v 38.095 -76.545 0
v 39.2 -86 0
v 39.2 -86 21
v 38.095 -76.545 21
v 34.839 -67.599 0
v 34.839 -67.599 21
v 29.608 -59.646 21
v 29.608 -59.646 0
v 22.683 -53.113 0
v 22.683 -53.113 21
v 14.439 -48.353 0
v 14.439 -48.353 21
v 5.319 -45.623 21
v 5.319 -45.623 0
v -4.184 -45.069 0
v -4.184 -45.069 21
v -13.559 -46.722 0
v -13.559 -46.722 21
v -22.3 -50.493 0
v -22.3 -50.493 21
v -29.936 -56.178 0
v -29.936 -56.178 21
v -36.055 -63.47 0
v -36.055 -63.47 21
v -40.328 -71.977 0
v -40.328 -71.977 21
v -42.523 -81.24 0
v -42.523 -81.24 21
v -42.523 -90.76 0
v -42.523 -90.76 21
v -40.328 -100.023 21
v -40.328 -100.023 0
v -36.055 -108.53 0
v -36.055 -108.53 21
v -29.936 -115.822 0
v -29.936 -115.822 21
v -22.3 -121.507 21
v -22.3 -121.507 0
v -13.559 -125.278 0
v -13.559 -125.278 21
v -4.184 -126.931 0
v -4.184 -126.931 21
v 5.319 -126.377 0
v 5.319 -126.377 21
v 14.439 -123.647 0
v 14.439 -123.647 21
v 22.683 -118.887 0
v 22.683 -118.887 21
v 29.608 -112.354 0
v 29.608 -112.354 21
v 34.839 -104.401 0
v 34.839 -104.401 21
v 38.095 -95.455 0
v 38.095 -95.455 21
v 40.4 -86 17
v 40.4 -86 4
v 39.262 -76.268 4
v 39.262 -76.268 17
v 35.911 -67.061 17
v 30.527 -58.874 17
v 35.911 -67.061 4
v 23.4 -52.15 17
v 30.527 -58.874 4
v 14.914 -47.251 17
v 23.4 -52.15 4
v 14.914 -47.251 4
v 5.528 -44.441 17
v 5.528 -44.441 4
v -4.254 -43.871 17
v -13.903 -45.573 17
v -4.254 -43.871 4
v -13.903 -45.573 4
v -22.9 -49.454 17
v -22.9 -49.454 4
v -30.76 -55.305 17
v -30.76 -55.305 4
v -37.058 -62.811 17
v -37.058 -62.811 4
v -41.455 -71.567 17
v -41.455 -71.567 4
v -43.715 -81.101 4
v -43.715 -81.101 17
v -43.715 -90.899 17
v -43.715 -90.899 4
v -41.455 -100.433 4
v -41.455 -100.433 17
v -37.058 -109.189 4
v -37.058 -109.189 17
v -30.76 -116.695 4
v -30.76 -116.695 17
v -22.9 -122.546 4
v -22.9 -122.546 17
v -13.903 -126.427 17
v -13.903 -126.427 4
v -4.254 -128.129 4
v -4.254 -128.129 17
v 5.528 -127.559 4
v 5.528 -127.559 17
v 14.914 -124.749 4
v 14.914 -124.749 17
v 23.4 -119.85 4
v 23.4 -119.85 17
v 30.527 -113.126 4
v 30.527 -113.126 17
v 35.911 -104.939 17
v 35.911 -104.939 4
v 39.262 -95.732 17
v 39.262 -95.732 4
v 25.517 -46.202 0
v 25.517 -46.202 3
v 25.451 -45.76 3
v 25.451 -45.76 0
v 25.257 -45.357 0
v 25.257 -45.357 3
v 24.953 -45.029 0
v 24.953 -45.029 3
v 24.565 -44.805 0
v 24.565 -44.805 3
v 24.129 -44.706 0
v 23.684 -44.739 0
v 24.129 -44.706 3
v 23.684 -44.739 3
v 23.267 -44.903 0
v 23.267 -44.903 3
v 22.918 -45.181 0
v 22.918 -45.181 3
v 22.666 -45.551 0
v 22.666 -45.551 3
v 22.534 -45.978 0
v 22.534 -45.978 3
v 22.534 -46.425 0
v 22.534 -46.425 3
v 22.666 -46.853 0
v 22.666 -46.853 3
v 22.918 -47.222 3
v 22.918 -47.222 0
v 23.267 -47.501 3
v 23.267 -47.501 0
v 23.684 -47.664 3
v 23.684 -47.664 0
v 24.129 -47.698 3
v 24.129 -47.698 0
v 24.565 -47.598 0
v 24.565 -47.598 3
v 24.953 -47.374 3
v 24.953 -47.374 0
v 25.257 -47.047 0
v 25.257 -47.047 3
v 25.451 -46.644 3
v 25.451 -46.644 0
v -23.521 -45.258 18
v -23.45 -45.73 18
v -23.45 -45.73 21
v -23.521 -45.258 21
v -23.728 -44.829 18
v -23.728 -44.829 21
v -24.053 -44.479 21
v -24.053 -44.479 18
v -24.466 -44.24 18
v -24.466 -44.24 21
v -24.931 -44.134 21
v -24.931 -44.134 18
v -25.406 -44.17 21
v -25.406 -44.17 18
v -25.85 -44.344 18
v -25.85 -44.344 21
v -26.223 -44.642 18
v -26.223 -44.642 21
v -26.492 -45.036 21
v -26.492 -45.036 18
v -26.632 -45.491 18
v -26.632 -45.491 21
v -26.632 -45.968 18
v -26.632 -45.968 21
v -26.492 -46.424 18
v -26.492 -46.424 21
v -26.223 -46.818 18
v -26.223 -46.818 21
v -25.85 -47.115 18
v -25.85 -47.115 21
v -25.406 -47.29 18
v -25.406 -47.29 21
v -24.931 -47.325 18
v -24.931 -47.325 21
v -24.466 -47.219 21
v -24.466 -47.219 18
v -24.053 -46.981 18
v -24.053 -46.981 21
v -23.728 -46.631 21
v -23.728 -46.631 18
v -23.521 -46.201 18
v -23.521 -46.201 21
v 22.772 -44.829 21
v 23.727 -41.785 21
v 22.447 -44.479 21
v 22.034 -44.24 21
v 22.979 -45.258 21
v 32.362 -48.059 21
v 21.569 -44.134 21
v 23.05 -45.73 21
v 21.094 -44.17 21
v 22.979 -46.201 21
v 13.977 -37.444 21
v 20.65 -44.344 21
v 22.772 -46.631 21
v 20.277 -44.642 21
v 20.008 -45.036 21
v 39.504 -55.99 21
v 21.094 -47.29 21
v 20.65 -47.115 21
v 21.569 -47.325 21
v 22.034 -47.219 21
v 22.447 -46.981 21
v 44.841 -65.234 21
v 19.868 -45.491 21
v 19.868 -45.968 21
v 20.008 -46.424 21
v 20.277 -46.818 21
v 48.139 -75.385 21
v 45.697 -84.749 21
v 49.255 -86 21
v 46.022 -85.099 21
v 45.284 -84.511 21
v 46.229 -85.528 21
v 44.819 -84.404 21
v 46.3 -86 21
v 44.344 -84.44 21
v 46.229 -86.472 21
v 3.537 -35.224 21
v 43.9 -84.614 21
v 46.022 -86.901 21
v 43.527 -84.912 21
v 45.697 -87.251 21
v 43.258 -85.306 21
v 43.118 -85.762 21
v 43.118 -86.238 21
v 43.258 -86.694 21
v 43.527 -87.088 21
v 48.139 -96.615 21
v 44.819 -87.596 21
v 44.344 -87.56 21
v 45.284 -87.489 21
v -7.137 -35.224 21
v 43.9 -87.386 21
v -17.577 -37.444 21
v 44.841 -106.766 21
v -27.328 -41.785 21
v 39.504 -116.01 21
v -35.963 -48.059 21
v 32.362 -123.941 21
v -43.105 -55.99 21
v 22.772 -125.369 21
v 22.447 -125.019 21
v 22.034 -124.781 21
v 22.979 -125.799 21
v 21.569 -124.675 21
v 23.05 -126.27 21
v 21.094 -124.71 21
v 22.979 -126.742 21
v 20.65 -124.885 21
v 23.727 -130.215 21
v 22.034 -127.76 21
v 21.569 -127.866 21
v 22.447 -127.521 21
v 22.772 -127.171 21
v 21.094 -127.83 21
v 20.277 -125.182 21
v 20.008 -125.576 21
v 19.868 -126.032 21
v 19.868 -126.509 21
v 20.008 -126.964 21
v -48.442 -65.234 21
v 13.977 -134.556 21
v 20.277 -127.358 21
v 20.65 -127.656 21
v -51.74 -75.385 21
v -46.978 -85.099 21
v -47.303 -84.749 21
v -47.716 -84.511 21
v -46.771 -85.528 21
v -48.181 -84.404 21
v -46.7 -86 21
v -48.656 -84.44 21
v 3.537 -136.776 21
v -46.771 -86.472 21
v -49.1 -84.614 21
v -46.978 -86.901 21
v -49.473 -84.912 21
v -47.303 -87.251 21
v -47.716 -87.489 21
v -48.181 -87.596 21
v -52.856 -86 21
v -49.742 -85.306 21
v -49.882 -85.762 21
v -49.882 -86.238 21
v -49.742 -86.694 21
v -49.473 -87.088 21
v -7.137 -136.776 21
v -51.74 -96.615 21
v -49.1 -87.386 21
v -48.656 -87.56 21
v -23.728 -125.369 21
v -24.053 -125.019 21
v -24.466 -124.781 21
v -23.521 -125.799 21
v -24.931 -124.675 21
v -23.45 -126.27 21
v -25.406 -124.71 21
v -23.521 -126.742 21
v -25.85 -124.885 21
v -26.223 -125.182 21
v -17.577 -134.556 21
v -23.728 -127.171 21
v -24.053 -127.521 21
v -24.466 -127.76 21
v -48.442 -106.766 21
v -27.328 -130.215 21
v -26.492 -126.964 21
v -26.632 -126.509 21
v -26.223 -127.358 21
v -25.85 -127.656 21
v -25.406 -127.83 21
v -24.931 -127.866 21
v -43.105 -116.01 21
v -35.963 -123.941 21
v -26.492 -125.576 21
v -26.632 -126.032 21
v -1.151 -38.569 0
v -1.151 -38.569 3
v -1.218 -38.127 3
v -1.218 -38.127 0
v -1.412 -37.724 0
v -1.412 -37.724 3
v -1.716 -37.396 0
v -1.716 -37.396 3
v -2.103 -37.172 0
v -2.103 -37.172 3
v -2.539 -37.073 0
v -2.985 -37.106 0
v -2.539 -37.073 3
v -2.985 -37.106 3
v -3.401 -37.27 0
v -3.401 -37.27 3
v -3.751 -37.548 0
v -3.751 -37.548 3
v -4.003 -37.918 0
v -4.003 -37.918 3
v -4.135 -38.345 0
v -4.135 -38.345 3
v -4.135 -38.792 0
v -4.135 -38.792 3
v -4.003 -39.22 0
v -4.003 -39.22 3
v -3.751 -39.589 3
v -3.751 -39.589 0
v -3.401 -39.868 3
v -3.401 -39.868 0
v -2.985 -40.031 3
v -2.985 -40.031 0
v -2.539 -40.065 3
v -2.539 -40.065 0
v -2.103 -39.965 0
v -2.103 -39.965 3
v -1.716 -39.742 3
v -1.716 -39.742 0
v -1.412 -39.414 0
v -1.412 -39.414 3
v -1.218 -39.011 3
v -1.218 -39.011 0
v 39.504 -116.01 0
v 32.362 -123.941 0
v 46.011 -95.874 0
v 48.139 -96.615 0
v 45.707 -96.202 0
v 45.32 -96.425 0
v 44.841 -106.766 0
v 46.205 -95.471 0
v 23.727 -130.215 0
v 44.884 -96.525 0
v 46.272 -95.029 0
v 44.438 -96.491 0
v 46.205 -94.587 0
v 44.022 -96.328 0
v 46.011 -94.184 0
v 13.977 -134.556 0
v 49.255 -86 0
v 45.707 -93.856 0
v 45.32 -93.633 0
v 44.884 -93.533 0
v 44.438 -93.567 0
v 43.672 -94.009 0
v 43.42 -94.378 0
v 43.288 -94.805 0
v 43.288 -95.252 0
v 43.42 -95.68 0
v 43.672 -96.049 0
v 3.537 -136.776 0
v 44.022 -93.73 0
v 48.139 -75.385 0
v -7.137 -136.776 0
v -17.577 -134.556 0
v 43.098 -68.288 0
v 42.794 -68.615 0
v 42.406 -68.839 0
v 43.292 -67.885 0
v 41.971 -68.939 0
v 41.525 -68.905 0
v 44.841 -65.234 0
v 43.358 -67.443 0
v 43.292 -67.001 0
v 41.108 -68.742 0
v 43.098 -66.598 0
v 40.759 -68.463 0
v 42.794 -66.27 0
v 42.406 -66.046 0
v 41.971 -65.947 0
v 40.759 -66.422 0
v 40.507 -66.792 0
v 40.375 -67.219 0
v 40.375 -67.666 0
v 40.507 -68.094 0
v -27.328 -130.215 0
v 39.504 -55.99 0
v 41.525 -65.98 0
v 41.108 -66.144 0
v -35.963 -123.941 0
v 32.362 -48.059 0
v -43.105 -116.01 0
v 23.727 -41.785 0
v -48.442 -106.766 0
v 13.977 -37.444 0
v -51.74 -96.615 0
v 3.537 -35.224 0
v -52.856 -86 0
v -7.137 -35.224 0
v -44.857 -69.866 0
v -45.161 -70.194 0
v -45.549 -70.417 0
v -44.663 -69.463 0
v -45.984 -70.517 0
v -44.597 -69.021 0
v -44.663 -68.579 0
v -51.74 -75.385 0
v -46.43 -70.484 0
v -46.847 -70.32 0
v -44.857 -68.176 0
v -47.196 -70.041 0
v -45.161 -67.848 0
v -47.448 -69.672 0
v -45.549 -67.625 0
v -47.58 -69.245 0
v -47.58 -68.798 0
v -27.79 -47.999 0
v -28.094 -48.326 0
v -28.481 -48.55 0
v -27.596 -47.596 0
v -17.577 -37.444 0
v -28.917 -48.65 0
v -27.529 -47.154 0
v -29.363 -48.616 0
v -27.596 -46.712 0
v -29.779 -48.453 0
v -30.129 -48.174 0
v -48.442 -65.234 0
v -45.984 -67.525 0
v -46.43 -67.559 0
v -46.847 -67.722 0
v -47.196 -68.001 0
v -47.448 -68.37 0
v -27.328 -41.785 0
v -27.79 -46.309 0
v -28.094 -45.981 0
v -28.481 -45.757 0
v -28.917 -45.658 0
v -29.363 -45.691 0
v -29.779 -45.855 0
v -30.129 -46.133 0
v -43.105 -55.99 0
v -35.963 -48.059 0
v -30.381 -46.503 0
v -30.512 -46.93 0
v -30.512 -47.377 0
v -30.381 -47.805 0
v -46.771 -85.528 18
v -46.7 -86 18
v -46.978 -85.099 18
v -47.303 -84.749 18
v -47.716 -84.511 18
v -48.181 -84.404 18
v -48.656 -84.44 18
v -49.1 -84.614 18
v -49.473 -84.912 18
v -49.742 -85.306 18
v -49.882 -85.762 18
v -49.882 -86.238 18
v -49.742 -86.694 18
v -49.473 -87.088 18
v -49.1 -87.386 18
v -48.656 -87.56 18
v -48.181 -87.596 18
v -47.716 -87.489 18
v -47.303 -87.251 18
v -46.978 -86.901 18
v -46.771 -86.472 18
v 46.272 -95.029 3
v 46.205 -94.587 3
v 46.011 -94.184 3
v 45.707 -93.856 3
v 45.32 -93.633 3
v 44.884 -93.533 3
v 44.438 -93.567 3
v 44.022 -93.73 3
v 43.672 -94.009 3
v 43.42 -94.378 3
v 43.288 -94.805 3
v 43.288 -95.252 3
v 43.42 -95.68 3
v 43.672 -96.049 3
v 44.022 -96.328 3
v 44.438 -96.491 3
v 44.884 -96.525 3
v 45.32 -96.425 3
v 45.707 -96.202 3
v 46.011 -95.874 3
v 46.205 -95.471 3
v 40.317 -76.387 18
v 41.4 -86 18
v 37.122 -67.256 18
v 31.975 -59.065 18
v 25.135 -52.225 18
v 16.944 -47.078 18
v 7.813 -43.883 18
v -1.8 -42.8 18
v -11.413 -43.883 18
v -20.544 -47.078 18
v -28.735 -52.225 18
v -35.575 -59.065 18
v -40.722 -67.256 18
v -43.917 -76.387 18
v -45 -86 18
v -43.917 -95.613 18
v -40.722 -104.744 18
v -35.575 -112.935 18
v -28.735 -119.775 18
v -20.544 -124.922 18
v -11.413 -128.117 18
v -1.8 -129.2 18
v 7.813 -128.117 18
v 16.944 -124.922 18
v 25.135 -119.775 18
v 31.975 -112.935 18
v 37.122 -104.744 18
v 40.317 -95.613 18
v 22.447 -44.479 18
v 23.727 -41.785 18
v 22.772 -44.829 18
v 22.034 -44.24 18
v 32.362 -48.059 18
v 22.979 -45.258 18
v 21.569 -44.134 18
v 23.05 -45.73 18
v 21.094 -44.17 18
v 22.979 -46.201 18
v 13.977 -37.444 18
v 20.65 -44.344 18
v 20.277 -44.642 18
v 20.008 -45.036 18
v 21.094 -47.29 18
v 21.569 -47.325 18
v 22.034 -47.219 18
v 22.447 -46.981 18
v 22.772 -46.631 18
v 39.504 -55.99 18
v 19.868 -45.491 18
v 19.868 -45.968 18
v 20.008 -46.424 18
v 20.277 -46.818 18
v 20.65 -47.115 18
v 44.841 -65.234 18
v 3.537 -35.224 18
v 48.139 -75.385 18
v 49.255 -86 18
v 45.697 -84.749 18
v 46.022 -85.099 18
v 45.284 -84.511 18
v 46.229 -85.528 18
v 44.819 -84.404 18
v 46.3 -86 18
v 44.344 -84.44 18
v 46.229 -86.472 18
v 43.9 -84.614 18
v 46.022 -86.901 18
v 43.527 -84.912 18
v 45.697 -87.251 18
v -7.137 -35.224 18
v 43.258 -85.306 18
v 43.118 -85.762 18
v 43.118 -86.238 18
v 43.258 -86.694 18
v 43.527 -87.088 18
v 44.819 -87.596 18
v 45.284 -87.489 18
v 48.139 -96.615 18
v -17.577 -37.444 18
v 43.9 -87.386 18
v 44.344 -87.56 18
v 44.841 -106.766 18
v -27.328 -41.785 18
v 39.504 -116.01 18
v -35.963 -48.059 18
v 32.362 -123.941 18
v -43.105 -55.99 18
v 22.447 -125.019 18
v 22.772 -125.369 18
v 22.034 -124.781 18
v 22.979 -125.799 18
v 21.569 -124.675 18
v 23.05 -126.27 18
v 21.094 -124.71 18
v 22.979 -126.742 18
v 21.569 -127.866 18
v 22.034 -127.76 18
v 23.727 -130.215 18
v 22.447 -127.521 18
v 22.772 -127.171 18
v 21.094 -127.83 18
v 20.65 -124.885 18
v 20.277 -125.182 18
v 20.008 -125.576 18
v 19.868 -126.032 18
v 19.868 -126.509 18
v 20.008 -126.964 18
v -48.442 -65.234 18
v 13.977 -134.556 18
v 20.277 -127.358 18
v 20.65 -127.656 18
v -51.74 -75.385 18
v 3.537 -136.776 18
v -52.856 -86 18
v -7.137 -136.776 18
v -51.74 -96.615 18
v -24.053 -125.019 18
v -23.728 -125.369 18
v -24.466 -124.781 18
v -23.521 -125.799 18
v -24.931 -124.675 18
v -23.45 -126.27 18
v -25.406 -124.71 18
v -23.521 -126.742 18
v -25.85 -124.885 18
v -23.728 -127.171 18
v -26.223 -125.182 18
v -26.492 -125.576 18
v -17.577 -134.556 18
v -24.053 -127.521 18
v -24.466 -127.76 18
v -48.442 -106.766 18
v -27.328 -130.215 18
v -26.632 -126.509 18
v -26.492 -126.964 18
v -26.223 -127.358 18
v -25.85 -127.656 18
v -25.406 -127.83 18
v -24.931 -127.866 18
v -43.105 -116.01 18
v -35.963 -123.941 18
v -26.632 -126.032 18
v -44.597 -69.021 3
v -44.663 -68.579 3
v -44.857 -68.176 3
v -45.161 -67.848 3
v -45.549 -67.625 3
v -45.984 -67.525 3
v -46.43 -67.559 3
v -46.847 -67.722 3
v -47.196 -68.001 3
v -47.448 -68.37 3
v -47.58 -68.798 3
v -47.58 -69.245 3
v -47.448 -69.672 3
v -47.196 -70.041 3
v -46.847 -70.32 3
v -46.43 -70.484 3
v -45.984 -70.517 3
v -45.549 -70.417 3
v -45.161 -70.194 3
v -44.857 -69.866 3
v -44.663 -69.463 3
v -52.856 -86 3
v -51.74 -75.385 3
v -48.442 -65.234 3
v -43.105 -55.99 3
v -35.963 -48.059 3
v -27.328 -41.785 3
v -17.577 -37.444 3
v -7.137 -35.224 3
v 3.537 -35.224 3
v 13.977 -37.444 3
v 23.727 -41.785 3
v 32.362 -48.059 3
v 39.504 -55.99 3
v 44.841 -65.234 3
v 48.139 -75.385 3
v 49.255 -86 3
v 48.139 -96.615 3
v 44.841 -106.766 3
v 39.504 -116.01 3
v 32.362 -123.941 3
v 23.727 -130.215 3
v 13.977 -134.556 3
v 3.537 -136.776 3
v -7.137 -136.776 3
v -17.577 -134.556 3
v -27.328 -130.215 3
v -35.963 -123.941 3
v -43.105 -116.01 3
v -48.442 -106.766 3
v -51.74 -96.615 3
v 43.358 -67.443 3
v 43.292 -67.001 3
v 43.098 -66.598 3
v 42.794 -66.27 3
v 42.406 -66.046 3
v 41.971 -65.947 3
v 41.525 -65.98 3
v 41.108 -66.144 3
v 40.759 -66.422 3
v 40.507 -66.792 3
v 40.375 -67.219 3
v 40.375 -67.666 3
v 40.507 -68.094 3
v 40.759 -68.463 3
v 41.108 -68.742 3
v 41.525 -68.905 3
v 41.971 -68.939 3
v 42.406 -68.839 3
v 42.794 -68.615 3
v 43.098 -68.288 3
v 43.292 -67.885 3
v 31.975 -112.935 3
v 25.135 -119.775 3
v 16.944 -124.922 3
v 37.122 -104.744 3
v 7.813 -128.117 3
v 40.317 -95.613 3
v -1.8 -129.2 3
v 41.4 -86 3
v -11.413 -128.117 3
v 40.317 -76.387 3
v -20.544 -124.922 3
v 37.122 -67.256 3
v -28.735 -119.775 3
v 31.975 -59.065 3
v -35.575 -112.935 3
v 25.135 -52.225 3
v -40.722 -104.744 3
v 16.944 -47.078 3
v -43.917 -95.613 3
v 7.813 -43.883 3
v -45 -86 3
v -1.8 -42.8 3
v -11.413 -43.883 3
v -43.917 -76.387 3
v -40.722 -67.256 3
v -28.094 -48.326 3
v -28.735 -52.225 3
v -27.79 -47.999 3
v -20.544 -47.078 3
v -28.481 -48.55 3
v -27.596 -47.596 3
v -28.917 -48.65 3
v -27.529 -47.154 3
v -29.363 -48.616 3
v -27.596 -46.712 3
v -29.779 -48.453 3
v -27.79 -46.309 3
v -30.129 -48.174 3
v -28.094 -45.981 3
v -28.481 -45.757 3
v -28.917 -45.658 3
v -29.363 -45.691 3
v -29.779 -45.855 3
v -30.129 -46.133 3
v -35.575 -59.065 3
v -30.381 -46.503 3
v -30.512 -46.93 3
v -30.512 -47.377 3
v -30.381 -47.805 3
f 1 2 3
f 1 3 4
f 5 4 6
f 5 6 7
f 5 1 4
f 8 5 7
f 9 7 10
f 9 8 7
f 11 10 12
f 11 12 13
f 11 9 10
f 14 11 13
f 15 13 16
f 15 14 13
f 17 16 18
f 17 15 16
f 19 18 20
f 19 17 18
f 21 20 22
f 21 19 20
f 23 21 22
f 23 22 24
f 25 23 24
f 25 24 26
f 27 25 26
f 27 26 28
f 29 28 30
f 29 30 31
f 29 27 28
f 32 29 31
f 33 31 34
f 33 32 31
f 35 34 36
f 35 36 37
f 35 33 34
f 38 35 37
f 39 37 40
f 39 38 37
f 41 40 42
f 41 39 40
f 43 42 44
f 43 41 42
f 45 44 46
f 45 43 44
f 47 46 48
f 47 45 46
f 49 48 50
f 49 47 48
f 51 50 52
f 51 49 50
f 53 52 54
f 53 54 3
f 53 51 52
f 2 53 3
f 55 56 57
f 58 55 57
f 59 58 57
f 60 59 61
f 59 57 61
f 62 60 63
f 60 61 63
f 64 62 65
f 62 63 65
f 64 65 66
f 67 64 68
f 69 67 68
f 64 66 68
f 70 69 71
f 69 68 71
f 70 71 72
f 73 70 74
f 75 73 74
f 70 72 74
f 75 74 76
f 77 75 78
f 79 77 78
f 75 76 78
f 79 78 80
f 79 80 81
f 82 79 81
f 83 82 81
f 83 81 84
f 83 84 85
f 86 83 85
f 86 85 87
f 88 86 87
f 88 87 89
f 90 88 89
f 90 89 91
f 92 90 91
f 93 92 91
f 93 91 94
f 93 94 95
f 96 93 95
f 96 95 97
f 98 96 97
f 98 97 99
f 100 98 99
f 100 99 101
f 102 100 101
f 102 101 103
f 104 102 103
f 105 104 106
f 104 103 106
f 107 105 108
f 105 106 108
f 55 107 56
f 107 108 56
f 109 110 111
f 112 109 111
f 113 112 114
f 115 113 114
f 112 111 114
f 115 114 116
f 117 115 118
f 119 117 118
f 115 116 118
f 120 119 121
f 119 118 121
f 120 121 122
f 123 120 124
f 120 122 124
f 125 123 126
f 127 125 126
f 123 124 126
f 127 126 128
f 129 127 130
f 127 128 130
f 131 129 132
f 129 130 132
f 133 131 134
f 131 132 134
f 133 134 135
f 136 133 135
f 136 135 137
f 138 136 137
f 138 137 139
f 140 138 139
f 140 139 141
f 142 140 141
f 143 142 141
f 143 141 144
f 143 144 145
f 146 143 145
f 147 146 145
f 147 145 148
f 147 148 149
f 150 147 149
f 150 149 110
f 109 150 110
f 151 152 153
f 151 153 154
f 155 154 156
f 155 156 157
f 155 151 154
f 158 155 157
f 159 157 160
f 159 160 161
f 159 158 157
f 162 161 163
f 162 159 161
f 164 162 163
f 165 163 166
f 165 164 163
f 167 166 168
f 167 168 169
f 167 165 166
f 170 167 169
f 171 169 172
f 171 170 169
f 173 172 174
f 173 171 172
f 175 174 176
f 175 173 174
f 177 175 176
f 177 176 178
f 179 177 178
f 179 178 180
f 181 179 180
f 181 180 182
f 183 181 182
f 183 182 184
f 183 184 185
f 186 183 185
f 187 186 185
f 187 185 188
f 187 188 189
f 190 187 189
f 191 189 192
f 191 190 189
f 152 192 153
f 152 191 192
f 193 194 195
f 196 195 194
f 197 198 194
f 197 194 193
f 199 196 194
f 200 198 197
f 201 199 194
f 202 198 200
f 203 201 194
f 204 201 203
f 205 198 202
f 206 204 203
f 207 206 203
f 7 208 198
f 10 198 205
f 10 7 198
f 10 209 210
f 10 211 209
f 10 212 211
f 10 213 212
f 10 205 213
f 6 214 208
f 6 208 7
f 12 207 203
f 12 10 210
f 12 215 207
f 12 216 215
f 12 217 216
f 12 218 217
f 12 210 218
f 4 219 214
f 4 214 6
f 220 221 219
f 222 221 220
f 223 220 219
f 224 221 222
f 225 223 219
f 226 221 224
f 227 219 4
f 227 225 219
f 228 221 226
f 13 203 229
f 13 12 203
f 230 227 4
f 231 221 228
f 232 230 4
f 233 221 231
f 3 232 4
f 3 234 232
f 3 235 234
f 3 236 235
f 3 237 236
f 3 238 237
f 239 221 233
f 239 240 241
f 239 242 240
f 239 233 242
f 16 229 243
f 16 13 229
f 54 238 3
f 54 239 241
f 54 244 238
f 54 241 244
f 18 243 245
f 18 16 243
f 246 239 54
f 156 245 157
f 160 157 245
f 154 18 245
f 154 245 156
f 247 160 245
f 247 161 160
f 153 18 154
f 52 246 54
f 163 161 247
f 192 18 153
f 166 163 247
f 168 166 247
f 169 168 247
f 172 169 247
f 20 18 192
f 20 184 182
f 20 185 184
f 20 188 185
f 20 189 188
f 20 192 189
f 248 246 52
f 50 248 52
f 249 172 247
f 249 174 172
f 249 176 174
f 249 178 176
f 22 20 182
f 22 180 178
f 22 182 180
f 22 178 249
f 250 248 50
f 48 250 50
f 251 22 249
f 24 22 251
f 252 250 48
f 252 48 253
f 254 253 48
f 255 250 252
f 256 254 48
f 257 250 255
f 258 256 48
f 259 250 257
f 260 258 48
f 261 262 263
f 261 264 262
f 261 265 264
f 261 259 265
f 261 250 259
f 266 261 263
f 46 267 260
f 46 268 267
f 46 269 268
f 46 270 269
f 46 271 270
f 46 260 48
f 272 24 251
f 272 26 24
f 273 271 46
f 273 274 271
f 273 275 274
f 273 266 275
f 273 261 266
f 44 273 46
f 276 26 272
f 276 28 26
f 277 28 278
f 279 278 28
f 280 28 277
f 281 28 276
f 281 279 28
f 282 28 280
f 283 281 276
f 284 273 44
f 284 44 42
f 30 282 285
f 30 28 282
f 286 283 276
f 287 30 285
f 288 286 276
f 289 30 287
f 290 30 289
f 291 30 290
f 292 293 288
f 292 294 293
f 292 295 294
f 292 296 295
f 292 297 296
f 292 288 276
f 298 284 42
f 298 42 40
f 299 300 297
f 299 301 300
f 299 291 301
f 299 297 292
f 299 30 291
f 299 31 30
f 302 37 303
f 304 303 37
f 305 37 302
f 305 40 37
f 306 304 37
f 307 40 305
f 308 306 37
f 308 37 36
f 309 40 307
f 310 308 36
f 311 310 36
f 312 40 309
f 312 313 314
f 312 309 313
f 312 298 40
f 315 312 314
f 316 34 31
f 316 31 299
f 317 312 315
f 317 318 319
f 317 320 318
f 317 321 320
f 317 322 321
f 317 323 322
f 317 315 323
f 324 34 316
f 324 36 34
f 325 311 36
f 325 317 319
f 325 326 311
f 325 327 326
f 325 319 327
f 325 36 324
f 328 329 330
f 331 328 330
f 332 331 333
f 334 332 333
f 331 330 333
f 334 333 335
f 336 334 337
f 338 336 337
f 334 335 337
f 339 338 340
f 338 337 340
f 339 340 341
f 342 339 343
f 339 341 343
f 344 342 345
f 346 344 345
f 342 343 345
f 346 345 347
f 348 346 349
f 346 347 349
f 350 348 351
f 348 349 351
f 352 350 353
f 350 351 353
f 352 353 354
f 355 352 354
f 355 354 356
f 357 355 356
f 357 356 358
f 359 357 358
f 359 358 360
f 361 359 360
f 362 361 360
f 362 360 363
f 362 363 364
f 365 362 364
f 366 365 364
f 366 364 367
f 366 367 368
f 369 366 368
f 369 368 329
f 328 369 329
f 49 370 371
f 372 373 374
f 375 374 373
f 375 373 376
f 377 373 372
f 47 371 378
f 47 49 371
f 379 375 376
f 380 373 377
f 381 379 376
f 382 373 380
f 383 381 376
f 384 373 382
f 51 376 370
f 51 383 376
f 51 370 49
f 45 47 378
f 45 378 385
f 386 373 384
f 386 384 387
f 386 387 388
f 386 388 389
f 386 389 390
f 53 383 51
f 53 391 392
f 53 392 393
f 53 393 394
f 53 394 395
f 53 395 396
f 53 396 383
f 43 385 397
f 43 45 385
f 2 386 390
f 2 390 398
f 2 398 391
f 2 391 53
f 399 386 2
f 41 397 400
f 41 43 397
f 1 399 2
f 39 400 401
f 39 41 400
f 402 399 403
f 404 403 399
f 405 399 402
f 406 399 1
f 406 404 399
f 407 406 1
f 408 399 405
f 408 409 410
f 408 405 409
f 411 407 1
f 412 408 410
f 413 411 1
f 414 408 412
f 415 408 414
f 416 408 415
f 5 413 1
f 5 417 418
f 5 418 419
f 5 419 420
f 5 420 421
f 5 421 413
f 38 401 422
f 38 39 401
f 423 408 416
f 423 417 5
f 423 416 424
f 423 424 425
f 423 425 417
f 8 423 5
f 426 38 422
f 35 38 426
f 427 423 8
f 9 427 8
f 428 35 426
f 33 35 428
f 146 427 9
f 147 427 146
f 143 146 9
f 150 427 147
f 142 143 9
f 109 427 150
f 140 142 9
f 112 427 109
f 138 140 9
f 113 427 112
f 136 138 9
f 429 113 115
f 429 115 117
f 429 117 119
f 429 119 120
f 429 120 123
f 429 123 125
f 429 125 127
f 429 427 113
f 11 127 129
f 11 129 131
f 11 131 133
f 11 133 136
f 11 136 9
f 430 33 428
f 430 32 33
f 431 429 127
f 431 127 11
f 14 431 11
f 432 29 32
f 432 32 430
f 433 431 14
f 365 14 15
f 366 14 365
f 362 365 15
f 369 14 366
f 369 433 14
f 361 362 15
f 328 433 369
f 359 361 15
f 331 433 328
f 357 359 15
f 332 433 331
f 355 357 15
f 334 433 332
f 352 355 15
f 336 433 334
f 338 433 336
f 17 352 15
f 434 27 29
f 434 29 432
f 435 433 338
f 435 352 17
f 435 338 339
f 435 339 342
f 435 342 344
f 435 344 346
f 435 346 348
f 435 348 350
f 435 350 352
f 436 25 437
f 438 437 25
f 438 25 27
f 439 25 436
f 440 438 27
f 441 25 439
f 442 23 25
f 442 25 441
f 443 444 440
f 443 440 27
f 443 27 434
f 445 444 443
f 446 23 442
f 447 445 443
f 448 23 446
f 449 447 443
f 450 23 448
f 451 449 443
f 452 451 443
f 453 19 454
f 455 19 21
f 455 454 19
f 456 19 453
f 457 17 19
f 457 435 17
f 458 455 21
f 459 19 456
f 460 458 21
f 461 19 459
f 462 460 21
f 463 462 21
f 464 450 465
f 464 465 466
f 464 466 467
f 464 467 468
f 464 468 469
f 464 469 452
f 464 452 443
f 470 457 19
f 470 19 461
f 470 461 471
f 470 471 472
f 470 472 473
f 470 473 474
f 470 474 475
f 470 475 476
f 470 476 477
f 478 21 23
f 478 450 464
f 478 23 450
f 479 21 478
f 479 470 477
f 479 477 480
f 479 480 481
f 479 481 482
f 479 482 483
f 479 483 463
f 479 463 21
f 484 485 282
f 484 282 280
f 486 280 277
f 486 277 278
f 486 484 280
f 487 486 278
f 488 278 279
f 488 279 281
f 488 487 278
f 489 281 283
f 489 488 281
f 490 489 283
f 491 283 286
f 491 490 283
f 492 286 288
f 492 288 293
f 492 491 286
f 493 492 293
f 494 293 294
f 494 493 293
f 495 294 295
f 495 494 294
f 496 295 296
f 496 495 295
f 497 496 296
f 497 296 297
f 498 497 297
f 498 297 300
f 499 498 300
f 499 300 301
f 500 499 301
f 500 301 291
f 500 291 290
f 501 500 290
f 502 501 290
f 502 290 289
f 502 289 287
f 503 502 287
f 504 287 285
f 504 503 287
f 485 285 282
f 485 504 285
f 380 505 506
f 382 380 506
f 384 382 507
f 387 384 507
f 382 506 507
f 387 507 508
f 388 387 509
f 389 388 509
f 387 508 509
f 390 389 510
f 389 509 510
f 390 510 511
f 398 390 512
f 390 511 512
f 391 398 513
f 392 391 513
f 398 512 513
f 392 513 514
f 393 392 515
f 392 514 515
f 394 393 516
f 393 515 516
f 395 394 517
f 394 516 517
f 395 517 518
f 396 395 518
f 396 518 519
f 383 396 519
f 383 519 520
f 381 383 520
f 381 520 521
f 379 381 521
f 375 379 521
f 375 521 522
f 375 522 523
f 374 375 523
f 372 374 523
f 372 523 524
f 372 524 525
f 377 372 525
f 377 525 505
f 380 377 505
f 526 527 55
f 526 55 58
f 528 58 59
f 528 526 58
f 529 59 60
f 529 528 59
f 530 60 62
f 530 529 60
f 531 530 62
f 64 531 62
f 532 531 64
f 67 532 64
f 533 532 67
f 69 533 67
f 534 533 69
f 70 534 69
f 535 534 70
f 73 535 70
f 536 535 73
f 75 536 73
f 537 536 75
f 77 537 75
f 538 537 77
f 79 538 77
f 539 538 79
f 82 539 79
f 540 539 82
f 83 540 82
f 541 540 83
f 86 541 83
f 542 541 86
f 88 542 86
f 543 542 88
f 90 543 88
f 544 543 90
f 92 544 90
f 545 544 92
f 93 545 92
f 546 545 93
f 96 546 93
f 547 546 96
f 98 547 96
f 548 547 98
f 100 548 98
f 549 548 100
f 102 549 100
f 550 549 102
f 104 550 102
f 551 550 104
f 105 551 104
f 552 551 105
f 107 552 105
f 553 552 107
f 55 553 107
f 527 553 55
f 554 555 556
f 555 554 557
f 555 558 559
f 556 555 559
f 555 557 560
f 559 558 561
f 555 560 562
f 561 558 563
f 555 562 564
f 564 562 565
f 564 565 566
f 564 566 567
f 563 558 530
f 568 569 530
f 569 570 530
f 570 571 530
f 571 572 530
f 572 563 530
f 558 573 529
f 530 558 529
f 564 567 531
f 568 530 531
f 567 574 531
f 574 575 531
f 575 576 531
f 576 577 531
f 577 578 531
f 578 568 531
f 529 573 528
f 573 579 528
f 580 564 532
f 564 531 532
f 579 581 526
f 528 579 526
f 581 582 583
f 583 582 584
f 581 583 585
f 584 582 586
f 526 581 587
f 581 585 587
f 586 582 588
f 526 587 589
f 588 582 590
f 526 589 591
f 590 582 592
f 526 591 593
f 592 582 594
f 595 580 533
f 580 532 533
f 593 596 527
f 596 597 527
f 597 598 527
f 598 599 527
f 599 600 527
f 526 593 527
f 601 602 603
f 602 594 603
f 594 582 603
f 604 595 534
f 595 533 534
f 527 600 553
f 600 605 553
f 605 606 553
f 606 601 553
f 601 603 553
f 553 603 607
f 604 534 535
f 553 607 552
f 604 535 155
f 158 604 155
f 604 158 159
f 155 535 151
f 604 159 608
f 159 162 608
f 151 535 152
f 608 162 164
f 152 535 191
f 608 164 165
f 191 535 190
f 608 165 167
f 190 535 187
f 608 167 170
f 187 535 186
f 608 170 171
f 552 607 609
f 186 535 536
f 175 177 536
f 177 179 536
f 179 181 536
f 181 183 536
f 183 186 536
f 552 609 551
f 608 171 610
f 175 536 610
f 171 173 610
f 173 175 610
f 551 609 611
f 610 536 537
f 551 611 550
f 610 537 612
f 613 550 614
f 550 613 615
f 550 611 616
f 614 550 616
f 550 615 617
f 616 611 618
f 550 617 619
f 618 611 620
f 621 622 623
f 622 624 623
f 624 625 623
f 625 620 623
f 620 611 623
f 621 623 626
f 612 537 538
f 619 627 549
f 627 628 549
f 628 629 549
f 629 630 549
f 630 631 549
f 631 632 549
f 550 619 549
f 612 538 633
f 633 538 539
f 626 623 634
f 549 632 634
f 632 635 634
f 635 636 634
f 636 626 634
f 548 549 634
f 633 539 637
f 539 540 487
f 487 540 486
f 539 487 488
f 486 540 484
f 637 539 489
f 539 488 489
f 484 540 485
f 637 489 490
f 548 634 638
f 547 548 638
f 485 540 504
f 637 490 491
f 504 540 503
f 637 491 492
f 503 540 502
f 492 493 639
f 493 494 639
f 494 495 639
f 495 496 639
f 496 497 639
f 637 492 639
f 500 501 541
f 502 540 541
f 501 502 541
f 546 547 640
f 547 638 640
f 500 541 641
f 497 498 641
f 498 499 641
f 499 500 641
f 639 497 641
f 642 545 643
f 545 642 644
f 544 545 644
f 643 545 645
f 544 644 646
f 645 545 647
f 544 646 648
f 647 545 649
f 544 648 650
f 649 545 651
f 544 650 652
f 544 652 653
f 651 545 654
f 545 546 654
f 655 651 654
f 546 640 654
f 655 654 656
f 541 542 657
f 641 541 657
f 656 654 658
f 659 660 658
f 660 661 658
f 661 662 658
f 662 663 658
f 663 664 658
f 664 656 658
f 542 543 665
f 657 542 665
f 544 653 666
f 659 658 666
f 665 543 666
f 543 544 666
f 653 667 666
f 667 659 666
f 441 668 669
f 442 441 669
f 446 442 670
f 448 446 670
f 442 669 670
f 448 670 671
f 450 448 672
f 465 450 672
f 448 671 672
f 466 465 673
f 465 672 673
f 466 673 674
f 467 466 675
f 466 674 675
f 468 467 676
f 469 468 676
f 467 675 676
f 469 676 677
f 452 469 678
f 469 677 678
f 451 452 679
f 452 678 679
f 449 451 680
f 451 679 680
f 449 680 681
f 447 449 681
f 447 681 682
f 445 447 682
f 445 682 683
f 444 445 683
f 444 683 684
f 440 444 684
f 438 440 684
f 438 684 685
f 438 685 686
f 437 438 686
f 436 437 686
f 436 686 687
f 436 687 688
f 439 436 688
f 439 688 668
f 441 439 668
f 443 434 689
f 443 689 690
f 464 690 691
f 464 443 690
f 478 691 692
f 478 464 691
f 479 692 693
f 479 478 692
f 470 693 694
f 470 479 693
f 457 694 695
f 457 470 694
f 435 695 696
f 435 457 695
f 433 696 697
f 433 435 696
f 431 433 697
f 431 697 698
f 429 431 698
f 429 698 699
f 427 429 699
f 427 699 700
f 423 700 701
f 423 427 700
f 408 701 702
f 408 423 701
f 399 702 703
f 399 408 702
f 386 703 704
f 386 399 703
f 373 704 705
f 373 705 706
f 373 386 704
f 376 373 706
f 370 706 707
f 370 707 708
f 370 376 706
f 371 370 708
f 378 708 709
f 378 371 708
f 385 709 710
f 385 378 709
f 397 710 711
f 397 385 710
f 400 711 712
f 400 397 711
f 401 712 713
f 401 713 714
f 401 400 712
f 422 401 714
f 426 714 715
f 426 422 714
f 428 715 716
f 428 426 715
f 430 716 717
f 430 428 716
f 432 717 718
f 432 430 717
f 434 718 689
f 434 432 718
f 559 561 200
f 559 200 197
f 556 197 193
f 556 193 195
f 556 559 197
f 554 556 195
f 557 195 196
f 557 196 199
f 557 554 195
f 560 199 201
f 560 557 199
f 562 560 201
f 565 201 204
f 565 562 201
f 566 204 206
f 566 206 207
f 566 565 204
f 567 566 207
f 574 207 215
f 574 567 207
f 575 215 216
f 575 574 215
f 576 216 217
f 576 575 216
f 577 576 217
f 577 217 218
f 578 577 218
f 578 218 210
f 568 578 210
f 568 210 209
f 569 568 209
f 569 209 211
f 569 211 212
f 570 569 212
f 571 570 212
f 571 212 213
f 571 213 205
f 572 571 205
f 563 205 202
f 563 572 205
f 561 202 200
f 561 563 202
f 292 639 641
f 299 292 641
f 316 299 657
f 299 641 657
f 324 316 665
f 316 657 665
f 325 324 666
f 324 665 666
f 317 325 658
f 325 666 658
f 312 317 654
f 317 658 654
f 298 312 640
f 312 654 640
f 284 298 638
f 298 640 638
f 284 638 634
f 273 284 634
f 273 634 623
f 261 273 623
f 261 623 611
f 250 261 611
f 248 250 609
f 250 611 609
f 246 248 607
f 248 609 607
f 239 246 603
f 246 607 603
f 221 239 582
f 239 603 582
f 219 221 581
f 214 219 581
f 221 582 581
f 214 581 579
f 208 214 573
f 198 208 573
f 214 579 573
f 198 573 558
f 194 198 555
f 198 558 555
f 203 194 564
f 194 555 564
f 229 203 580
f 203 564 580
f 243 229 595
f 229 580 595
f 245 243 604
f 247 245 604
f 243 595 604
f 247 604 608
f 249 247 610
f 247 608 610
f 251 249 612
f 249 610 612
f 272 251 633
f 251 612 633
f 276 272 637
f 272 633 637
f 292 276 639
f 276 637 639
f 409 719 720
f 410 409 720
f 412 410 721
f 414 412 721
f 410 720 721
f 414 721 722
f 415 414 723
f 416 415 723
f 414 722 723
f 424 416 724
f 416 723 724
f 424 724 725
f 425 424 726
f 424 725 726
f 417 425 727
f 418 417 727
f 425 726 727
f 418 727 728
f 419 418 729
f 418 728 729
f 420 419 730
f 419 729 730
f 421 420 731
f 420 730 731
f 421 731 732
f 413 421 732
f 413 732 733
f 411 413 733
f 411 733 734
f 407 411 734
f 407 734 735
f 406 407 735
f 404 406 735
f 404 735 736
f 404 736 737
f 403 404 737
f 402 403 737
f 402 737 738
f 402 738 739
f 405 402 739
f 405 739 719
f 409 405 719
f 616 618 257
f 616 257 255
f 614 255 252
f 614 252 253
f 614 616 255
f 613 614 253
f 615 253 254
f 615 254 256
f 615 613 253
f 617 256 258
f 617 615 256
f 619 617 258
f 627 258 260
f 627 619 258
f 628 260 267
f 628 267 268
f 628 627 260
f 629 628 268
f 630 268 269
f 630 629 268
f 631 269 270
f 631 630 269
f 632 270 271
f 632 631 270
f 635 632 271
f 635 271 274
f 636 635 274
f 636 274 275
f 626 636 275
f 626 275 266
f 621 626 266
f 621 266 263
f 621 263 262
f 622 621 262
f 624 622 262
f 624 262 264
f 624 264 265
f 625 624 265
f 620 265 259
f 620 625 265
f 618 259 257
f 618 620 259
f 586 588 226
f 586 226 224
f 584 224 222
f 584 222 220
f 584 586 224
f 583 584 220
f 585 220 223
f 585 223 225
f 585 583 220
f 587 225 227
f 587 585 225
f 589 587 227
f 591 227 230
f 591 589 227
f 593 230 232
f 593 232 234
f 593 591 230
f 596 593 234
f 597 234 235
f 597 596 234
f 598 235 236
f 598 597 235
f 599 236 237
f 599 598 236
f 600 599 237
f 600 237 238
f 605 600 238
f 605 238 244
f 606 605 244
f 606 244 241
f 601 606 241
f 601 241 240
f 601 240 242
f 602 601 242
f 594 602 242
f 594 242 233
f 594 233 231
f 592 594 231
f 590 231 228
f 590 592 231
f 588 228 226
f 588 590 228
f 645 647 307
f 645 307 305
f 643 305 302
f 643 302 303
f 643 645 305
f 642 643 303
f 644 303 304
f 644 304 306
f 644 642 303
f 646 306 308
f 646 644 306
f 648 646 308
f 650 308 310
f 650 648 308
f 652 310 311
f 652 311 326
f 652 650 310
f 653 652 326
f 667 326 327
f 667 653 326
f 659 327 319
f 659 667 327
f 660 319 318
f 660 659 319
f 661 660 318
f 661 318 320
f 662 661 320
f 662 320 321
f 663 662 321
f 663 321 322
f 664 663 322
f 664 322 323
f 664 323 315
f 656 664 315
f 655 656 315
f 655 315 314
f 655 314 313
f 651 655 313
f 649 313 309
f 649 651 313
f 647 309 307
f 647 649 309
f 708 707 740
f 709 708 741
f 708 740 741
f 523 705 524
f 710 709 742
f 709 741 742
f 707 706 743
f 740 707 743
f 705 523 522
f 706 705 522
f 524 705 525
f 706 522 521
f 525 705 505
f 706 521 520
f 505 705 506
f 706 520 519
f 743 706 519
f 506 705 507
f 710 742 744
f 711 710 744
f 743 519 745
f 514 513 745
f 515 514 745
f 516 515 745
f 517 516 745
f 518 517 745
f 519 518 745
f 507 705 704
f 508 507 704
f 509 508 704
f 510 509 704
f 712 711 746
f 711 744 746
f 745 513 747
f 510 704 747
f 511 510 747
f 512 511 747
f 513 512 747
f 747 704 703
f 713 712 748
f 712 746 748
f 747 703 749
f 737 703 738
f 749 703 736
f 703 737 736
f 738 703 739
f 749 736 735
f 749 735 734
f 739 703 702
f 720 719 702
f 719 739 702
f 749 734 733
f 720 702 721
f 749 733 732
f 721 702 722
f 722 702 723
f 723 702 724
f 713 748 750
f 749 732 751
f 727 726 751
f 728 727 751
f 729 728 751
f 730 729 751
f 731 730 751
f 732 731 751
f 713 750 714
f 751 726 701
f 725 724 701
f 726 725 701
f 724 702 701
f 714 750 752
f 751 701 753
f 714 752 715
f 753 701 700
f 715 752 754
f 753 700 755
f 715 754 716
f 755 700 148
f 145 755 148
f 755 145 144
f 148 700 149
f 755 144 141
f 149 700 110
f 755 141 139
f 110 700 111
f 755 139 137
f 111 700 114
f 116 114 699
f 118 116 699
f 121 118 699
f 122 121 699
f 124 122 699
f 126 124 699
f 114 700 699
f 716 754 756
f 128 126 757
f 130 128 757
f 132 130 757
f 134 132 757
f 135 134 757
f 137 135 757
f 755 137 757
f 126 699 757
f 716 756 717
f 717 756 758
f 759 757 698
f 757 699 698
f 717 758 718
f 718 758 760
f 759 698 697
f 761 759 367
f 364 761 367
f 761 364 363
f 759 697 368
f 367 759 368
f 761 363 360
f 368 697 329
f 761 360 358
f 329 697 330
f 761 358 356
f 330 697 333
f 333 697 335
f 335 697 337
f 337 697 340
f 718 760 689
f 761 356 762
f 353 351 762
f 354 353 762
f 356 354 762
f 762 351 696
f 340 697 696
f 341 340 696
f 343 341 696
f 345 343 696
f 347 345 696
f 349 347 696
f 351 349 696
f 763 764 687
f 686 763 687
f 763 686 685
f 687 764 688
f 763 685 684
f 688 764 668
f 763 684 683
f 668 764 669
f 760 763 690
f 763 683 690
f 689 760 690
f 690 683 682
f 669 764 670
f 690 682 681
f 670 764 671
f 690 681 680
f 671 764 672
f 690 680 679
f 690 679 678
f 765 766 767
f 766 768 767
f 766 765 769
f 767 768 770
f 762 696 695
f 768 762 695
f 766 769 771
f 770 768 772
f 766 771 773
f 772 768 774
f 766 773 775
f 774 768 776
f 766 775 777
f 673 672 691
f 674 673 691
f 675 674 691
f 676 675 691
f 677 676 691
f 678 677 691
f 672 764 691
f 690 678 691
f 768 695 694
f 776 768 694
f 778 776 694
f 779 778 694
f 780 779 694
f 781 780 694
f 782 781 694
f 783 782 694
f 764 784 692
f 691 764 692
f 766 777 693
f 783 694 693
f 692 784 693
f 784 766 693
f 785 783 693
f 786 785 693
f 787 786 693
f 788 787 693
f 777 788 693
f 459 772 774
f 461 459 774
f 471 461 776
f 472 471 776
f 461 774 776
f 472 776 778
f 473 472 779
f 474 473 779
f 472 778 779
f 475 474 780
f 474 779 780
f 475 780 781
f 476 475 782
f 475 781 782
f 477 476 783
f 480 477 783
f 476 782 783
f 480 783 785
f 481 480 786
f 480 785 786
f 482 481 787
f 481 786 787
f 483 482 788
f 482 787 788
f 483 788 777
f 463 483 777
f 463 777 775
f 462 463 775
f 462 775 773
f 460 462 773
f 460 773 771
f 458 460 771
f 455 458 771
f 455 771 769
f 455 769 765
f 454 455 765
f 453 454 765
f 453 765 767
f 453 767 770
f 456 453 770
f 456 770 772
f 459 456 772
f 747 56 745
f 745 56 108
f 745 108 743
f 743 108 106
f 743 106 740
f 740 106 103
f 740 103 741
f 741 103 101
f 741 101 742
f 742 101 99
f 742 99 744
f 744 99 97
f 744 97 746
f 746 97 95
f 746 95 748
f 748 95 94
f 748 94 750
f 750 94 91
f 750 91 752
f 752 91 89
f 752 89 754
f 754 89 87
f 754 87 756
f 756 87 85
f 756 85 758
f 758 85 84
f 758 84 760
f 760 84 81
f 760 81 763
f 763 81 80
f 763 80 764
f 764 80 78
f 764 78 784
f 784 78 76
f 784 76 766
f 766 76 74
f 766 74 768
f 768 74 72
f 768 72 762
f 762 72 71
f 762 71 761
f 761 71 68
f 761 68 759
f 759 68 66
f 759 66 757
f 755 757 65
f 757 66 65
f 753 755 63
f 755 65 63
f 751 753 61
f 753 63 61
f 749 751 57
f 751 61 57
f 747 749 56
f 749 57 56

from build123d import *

# Parameters (mm, degrees)
SKETCH_1_R          = 42.2
SKETCH_1_R_2        = 41
EXTRUDE_1_DEPTH     = 21
SKETCH_2_R          = 51.055310859
SKETCH_2_R_2        = 42.2
EXTRUDE_2_DEPTH     = 3
SKETCH_3_R          = 1.5
CUT_EXTRUDE_1_DEPTH = 12
EXTRUDE1_START      = -3
SKETCH1_R           = 51.055310859
SKETCH1_R_2         = 42.2
SKETCH1_R_3         = 1.6
EXTRUDE1_DEPTH      = 3
CHAMFER1_SIZE       = 1


with BuildPart() as part:
    # 草图1 → 凸台-拉伸1 (new body)
    with BuildSketch(Plane.XY):
        with Locations((-1.800213466, -86)):
            Circle(SKETCH_1_R)
        with Locations((-1.800213466, -86)):
            Circle(SKETCH_1_R_2, mode=Mode.SUBTRACT)
    extrude(amount=EXTRUDE_1_DEPTH)

    # 草图2 → 凸台-拉伸2 (add)
    with BuildSketch(Plane(origin=(0, 0, 0), x_dir=(-1, 0, 0), z_dir=(0, 0, -1))):
        with Locations((1.800213466, -86)):
            Circle(SKETCH_2_R)
        with Locations((1.800213466, -86)):
            Circle(SKETCH_2_R_2, mode=Mode.SUBTRACT)
    extrude(amount=-EXTRUDE_2_DEPTH)

    # 草图3 → 切除-拉伸1 (cut)
    with BuildSketch(Plane.XY.offset(3)):
        with Locations((44.771512493, -95.028924631)):
            Circle(SKETCH_3_R)
        with Locations((-2.651398789, -38.568759005)):
            Circle(SKETCH_3_R)
        with Locations((41.858407753, -67.4427391)):
            Circle(SKETCH_3_R)
        with Locations((24.017335287, -46.20174231)):
            Circle(SKETCH_3_R)
        with Locations((-46.096553953, -69.021149678)):
            Circle(SKETCH_3_R)
        with Locations((-29.029091447, -47.153695895)):
            Circle(SKETCH_3_R)
    extrude(amount=-CUT_EXTRUDE_1_DEPTH, mode=Mode.SUBTRACT)

    # Sketch1 → Extrude1 (add)
    with BuildSketch(Plane.XY.offset(21).offset(EXTRUDE1_START)):
        with Locations(Location((-1.800213466, -86, 0), (0, 0, 180))):
            Circle(SKETCH1_R)
        with Locations(Location((-1.800213466, -86, 0), (0, 0, 180))):
            Circle(SKETCH1_R_2, mode=Mode.SUBTRACT)
        with Locations((-25.050213466, -45.729818724)):
            Circle(SKETCH1_R_3, mode=Mode.SUBTRACT)
        with Locations((21.449786534, -45.729818724)):
            Circle(SKETCH1_R_3, mode=Mode.SUBTRACT)
        with Locations((44.699786534, -86)):
            Circle(SKETCH1_R_3, mode=Mode.SUBTRACT)
        with Locations((21.449786534, -126.270181276)):
            Circle(SKETCH1_R_3, mode=Mode.SUBTRACT)
        with Locations((-25.050213466, -126.270181276)):
            Circle(SKETCH1_R_3, mode=Mode.SUBTRACT)
        with Locations((-48.300213466, -86)):
            Circle(SKETCH1_R_3, mode=Mode.SUBTRACT)
    extrude(amount=EXTRUDE1_DEPTH)

    # Chamfer1
    chamfer1_edges = [part.edges().sort_by_distance(p)[0] for p in [
        (-44.000213466, -86, 3),
        (-44.000213466, -86, 18),
    ]]
    chamfer(chamfer1_edges, length=CHAMFER1_SIZE)


solid = part.part
